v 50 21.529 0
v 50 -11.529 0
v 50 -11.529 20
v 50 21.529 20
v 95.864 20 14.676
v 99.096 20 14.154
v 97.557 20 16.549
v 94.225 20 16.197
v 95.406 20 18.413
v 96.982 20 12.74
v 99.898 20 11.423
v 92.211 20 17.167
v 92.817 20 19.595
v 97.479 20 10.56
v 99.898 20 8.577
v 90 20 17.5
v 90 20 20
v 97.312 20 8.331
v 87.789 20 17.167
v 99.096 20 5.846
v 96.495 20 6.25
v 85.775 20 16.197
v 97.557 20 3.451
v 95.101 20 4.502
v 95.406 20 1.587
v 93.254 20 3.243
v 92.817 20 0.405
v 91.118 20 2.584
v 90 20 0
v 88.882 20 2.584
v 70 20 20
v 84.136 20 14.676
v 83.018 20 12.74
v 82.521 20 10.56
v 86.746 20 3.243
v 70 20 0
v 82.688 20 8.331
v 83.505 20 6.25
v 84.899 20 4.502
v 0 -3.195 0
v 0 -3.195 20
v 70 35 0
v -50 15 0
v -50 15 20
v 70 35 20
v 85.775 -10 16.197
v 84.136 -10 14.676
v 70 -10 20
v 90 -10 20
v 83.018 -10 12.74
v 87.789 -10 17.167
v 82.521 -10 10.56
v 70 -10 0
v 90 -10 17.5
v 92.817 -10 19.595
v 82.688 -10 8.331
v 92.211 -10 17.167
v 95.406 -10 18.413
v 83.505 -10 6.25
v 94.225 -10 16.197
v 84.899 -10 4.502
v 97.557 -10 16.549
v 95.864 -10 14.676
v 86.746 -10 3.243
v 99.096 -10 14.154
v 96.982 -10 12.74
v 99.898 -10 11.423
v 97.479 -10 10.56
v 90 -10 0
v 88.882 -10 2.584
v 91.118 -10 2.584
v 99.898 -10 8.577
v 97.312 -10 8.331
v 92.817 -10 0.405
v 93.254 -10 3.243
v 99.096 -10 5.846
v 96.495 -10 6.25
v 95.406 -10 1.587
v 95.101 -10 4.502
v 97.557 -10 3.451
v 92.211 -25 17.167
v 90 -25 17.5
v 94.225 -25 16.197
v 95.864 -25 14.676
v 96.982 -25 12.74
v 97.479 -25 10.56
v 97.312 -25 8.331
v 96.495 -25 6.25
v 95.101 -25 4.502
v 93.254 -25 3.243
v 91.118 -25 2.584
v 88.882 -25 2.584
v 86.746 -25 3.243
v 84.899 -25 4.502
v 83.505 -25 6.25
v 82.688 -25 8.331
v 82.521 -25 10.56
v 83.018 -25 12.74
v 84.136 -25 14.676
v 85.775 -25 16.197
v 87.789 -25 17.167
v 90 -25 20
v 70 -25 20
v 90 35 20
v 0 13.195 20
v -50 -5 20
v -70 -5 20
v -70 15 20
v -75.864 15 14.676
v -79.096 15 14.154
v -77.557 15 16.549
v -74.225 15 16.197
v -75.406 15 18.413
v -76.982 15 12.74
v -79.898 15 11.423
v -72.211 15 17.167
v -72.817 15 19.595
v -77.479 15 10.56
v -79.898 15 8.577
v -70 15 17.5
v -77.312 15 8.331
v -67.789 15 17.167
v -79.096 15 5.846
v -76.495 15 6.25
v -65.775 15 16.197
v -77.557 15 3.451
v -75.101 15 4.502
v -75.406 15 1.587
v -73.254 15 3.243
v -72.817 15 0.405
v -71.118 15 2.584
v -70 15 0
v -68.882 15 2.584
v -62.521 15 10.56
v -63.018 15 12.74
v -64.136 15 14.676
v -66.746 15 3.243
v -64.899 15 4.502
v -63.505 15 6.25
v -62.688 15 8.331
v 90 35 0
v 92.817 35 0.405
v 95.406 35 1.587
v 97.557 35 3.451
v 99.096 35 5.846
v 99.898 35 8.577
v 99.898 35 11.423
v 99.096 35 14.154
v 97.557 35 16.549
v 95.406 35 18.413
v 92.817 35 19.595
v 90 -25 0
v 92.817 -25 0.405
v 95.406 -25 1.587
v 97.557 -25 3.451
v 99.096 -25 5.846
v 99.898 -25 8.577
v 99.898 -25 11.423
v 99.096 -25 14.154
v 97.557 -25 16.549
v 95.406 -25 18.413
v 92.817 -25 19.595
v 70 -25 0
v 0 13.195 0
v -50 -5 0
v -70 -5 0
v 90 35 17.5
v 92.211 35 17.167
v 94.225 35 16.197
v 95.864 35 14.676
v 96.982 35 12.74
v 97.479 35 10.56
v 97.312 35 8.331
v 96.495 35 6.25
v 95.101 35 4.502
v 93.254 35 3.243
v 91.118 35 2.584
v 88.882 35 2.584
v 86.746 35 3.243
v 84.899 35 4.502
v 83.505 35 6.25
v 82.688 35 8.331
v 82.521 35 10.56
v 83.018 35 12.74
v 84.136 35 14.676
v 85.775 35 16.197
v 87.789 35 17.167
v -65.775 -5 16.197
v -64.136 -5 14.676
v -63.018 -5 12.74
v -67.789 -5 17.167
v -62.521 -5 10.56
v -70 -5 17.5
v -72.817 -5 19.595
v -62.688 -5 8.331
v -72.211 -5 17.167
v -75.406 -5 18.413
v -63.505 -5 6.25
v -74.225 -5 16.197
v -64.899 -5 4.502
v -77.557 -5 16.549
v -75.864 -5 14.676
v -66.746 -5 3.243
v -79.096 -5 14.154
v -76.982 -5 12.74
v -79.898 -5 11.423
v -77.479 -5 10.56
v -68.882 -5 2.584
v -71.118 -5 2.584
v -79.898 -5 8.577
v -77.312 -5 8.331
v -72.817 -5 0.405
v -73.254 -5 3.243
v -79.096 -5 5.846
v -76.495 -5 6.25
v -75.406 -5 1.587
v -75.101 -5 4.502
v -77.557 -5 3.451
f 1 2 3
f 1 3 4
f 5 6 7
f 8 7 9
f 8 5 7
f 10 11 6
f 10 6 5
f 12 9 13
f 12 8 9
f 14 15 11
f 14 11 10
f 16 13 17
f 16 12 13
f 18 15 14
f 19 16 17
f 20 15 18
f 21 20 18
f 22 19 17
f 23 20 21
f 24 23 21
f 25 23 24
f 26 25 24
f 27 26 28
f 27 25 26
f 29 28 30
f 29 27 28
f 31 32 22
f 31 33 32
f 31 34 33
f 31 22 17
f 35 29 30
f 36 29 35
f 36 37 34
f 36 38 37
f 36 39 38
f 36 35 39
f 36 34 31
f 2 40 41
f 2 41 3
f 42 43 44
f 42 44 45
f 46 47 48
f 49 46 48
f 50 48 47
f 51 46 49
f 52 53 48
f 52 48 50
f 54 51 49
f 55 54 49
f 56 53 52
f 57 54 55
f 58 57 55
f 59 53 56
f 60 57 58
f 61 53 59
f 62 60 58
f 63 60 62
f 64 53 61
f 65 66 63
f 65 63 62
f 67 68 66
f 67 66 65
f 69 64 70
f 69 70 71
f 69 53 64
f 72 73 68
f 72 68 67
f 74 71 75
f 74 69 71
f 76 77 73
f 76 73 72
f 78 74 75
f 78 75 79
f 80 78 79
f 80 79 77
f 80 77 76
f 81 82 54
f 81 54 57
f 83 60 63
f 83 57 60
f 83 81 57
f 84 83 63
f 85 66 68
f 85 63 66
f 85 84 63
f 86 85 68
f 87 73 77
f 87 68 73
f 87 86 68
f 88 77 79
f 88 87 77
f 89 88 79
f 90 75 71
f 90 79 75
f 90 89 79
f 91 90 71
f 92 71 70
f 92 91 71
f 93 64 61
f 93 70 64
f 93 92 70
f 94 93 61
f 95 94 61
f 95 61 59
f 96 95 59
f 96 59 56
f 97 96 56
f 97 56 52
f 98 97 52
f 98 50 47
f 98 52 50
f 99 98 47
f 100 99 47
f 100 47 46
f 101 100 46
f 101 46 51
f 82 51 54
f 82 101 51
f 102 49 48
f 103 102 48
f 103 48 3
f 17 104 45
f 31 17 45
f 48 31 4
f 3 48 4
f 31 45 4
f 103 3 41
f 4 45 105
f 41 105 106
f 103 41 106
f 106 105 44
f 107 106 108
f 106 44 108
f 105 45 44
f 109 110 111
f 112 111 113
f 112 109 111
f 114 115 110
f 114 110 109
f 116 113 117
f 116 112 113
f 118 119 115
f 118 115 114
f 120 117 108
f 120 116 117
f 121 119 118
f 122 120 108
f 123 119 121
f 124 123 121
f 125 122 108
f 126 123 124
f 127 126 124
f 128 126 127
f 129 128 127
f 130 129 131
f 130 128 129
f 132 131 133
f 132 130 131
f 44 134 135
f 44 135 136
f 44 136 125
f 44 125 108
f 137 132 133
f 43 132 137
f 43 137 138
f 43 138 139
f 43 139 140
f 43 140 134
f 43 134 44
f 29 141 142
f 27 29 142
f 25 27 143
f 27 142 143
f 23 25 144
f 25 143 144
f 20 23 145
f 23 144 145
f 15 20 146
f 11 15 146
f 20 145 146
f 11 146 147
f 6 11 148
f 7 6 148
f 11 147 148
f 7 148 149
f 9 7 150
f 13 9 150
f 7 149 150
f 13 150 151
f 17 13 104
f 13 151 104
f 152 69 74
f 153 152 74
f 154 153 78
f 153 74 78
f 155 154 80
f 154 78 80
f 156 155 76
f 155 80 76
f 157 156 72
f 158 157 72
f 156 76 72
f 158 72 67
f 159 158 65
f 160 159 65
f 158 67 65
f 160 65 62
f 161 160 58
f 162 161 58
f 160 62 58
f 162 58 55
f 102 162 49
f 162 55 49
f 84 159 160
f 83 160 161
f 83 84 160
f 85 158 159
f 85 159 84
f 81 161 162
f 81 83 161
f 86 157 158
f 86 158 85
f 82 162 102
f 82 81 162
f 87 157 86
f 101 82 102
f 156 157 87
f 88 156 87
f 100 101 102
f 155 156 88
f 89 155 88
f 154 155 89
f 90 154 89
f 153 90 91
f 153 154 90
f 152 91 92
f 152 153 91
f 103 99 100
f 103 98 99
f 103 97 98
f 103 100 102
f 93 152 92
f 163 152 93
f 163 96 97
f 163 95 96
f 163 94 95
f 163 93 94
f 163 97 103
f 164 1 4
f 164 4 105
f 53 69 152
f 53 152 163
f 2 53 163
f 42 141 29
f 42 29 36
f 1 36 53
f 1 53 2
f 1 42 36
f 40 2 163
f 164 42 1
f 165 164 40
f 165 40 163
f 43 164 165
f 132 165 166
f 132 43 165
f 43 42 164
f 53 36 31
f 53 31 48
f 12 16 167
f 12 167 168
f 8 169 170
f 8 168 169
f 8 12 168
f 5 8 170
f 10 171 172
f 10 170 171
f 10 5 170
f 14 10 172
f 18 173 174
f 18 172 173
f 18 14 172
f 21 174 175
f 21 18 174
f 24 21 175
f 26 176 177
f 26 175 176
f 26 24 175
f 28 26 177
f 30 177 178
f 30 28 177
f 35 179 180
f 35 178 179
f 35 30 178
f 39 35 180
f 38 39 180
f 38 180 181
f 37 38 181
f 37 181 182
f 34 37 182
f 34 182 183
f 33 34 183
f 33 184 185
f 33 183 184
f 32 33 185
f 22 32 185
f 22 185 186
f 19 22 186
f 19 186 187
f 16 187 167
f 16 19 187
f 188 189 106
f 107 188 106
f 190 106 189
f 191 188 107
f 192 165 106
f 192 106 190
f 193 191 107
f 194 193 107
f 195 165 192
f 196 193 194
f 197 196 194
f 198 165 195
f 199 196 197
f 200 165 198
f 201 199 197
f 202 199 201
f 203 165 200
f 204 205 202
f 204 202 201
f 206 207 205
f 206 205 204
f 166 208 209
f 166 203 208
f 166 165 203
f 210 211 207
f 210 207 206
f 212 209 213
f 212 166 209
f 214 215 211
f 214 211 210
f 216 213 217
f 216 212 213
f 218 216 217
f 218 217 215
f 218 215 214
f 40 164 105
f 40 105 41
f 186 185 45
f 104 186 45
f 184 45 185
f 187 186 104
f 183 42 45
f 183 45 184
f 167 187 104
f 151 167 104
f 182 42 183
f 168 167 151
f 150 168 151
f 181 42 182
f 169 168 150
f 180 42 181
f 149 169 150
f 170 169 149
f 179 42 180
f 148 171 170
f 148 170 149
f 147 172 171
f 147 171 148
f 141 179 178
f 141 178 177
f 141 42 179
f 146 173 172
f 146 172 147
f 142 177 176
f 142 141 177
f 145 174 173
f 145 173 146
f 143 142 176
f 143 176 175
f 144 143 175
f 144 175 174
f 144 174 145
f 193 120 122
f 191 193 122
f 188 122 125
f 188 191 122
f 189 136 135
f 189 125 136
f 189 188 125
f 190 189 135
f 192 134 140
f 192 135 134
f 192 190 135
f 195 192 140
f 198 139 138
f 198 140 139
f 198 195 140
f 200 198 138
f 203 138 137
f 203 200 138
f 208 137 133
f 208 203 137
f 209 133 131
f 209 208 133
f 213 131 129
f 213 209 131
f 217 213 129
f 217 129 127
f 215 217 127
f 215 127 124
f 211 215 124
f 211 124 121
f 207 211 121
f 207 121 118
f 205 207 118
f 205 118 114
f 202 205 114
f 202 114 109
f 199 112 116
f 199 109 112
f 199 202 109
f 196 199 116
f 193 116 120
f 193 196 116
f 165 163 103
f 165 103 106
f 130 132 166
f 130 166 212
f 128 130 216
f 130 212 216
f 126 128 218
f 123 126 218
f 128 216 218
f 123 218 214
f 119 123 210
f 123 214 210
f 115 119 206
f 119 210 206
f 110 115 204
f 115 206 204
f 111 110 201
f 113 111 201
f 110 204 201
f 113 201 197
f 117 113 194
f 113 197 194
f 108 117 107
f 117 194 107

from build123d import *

# Parameters (mm, degrees)
BASE_EXTRUDE_DEPTH      = 20
FILLET1_R               = 10
CUT_EXTRUDE1_DEPTH      = 108.819293264
CUT_EXTRUDE1_DEPTH_BACK = 108.819293264
SKETCH2_R               = 7.5


with BuildPart() as part:
    # Sketch1 → Base-Extrude (new body)
    with BuildSketch(Plane.XY):
        Polygon((-80, 15), (-50, 15), (70, 35), (100, 35), (100, 20), (70, 20), (70, -10), (100, -10), (100, -25), (70, -25), (-50, -5), (-80, -5), align=None)
        Polygon((50, 21.528729116), (0, 13.195395783), (0, -3.195395783), (50, -11.528729116), align=None, mode=Mode.SUBTRACT)
    extrude(amount=BASE_EXTRUDE_DEPTH)

    # Fillet1
    # the kernel refuses this fillet: 10 mm, written as the material it takes off along each edge
    with BuildSketch(Plane(origin=(100, 60, 0), x_dir=(0, 0, 1), z_dir=(0, -1, 0)), Plane(origin=(100, 15, 0), x_dir=(0, 0, 1), z_dir=(0, -1, 0))) as fillet1_piece_1:
        with BuildLine():
            CenterArc((FILLET1_R, FILLET1_R), FILLET1_R, 180, 90)
            Line((0, FILLET1_R), (0, 0))
            Line((0, 0), (FILLET1_R, 0))
        make_face()
    extrude(amount=65, mode=Mode.SUBTRACT)
    with BuildSketch(Plane(origin=(-80, -30, 0), x_dir=(0, 0, 1), z_dir=(0, 1, 0))) as fillet1_piece_2:
        with BuildLine():
            CenterArc((FILLET1_R, FILLET1_R), FILLET1_R, 180, 90)
            Line((0, FILLET1_R), (0, 0))
            Line((0, 0), (FILLET1_R, 0))
        make_face()
    extrude(amount=70, mode=Mode.SUBTRACT)
    with BuildSketch(Plane(origin=(100, 15, 20), x_dir=(0, 0, -1), z_dir=(0, -1, 0)), Plane(origin=(100, 60, 20), x_dir=(0, 0, -1), z_dir=(0, -1, 0))) as fillet1_piece_3:
        with BuildLine():
            CenterArc((FILLET1_R, -FILLET1_R), FILLET1_R, 90, 90)
            Line((0, -FILLET1_R), (0, 0))
            Line((0, 0), (FILLET1_R, 0))
        make_face()
    extrude(amount=65, mode=Mode.SUBTRACT)
    with BuildSketch(Plane(origin=(-80, -30, 20), x_dir=(0, 0, -1), z_dir=(0, 1, 0))) as fillet1_piece_4:
        with BuildLine():
            CenterArc((FILLET1_R, -FILLET1_R), FILLET1_R, 90, 90)
            Line((0, -FILLET1_R), (0, 0))
            Line((0, 0), (FILLET1_R, 0))
        make_face()
    extrude(amount=70, mode=Mode.SUBTRACT)

    # Sketch2 → Cut-Extrude1 (cut, two sides: drawn at the far end of the back side and taken through both)
    with BuildSketch(Plane(origin=(0, 0, 0), x_dir=(1, 0, 0), z_dir=(0, 1, 0)).offset(-CUT_EXTRUDE1_DEPTH_BACK)):
        with Locations(Location((90, -10, 0), (0, 0, 270))):
            Circle(SKETCH2_R)
        with Locations(Location((-70, -10, 0), (0, 0, 270))):
            Circle(SKETCH2_R)
    extrude(amount=CUT_EXTRUDE1_DEPTH + CUT_EXTRUDE1_DEPTH_BACK, mode=Mode.SUBTRACT)


solid = part.part
